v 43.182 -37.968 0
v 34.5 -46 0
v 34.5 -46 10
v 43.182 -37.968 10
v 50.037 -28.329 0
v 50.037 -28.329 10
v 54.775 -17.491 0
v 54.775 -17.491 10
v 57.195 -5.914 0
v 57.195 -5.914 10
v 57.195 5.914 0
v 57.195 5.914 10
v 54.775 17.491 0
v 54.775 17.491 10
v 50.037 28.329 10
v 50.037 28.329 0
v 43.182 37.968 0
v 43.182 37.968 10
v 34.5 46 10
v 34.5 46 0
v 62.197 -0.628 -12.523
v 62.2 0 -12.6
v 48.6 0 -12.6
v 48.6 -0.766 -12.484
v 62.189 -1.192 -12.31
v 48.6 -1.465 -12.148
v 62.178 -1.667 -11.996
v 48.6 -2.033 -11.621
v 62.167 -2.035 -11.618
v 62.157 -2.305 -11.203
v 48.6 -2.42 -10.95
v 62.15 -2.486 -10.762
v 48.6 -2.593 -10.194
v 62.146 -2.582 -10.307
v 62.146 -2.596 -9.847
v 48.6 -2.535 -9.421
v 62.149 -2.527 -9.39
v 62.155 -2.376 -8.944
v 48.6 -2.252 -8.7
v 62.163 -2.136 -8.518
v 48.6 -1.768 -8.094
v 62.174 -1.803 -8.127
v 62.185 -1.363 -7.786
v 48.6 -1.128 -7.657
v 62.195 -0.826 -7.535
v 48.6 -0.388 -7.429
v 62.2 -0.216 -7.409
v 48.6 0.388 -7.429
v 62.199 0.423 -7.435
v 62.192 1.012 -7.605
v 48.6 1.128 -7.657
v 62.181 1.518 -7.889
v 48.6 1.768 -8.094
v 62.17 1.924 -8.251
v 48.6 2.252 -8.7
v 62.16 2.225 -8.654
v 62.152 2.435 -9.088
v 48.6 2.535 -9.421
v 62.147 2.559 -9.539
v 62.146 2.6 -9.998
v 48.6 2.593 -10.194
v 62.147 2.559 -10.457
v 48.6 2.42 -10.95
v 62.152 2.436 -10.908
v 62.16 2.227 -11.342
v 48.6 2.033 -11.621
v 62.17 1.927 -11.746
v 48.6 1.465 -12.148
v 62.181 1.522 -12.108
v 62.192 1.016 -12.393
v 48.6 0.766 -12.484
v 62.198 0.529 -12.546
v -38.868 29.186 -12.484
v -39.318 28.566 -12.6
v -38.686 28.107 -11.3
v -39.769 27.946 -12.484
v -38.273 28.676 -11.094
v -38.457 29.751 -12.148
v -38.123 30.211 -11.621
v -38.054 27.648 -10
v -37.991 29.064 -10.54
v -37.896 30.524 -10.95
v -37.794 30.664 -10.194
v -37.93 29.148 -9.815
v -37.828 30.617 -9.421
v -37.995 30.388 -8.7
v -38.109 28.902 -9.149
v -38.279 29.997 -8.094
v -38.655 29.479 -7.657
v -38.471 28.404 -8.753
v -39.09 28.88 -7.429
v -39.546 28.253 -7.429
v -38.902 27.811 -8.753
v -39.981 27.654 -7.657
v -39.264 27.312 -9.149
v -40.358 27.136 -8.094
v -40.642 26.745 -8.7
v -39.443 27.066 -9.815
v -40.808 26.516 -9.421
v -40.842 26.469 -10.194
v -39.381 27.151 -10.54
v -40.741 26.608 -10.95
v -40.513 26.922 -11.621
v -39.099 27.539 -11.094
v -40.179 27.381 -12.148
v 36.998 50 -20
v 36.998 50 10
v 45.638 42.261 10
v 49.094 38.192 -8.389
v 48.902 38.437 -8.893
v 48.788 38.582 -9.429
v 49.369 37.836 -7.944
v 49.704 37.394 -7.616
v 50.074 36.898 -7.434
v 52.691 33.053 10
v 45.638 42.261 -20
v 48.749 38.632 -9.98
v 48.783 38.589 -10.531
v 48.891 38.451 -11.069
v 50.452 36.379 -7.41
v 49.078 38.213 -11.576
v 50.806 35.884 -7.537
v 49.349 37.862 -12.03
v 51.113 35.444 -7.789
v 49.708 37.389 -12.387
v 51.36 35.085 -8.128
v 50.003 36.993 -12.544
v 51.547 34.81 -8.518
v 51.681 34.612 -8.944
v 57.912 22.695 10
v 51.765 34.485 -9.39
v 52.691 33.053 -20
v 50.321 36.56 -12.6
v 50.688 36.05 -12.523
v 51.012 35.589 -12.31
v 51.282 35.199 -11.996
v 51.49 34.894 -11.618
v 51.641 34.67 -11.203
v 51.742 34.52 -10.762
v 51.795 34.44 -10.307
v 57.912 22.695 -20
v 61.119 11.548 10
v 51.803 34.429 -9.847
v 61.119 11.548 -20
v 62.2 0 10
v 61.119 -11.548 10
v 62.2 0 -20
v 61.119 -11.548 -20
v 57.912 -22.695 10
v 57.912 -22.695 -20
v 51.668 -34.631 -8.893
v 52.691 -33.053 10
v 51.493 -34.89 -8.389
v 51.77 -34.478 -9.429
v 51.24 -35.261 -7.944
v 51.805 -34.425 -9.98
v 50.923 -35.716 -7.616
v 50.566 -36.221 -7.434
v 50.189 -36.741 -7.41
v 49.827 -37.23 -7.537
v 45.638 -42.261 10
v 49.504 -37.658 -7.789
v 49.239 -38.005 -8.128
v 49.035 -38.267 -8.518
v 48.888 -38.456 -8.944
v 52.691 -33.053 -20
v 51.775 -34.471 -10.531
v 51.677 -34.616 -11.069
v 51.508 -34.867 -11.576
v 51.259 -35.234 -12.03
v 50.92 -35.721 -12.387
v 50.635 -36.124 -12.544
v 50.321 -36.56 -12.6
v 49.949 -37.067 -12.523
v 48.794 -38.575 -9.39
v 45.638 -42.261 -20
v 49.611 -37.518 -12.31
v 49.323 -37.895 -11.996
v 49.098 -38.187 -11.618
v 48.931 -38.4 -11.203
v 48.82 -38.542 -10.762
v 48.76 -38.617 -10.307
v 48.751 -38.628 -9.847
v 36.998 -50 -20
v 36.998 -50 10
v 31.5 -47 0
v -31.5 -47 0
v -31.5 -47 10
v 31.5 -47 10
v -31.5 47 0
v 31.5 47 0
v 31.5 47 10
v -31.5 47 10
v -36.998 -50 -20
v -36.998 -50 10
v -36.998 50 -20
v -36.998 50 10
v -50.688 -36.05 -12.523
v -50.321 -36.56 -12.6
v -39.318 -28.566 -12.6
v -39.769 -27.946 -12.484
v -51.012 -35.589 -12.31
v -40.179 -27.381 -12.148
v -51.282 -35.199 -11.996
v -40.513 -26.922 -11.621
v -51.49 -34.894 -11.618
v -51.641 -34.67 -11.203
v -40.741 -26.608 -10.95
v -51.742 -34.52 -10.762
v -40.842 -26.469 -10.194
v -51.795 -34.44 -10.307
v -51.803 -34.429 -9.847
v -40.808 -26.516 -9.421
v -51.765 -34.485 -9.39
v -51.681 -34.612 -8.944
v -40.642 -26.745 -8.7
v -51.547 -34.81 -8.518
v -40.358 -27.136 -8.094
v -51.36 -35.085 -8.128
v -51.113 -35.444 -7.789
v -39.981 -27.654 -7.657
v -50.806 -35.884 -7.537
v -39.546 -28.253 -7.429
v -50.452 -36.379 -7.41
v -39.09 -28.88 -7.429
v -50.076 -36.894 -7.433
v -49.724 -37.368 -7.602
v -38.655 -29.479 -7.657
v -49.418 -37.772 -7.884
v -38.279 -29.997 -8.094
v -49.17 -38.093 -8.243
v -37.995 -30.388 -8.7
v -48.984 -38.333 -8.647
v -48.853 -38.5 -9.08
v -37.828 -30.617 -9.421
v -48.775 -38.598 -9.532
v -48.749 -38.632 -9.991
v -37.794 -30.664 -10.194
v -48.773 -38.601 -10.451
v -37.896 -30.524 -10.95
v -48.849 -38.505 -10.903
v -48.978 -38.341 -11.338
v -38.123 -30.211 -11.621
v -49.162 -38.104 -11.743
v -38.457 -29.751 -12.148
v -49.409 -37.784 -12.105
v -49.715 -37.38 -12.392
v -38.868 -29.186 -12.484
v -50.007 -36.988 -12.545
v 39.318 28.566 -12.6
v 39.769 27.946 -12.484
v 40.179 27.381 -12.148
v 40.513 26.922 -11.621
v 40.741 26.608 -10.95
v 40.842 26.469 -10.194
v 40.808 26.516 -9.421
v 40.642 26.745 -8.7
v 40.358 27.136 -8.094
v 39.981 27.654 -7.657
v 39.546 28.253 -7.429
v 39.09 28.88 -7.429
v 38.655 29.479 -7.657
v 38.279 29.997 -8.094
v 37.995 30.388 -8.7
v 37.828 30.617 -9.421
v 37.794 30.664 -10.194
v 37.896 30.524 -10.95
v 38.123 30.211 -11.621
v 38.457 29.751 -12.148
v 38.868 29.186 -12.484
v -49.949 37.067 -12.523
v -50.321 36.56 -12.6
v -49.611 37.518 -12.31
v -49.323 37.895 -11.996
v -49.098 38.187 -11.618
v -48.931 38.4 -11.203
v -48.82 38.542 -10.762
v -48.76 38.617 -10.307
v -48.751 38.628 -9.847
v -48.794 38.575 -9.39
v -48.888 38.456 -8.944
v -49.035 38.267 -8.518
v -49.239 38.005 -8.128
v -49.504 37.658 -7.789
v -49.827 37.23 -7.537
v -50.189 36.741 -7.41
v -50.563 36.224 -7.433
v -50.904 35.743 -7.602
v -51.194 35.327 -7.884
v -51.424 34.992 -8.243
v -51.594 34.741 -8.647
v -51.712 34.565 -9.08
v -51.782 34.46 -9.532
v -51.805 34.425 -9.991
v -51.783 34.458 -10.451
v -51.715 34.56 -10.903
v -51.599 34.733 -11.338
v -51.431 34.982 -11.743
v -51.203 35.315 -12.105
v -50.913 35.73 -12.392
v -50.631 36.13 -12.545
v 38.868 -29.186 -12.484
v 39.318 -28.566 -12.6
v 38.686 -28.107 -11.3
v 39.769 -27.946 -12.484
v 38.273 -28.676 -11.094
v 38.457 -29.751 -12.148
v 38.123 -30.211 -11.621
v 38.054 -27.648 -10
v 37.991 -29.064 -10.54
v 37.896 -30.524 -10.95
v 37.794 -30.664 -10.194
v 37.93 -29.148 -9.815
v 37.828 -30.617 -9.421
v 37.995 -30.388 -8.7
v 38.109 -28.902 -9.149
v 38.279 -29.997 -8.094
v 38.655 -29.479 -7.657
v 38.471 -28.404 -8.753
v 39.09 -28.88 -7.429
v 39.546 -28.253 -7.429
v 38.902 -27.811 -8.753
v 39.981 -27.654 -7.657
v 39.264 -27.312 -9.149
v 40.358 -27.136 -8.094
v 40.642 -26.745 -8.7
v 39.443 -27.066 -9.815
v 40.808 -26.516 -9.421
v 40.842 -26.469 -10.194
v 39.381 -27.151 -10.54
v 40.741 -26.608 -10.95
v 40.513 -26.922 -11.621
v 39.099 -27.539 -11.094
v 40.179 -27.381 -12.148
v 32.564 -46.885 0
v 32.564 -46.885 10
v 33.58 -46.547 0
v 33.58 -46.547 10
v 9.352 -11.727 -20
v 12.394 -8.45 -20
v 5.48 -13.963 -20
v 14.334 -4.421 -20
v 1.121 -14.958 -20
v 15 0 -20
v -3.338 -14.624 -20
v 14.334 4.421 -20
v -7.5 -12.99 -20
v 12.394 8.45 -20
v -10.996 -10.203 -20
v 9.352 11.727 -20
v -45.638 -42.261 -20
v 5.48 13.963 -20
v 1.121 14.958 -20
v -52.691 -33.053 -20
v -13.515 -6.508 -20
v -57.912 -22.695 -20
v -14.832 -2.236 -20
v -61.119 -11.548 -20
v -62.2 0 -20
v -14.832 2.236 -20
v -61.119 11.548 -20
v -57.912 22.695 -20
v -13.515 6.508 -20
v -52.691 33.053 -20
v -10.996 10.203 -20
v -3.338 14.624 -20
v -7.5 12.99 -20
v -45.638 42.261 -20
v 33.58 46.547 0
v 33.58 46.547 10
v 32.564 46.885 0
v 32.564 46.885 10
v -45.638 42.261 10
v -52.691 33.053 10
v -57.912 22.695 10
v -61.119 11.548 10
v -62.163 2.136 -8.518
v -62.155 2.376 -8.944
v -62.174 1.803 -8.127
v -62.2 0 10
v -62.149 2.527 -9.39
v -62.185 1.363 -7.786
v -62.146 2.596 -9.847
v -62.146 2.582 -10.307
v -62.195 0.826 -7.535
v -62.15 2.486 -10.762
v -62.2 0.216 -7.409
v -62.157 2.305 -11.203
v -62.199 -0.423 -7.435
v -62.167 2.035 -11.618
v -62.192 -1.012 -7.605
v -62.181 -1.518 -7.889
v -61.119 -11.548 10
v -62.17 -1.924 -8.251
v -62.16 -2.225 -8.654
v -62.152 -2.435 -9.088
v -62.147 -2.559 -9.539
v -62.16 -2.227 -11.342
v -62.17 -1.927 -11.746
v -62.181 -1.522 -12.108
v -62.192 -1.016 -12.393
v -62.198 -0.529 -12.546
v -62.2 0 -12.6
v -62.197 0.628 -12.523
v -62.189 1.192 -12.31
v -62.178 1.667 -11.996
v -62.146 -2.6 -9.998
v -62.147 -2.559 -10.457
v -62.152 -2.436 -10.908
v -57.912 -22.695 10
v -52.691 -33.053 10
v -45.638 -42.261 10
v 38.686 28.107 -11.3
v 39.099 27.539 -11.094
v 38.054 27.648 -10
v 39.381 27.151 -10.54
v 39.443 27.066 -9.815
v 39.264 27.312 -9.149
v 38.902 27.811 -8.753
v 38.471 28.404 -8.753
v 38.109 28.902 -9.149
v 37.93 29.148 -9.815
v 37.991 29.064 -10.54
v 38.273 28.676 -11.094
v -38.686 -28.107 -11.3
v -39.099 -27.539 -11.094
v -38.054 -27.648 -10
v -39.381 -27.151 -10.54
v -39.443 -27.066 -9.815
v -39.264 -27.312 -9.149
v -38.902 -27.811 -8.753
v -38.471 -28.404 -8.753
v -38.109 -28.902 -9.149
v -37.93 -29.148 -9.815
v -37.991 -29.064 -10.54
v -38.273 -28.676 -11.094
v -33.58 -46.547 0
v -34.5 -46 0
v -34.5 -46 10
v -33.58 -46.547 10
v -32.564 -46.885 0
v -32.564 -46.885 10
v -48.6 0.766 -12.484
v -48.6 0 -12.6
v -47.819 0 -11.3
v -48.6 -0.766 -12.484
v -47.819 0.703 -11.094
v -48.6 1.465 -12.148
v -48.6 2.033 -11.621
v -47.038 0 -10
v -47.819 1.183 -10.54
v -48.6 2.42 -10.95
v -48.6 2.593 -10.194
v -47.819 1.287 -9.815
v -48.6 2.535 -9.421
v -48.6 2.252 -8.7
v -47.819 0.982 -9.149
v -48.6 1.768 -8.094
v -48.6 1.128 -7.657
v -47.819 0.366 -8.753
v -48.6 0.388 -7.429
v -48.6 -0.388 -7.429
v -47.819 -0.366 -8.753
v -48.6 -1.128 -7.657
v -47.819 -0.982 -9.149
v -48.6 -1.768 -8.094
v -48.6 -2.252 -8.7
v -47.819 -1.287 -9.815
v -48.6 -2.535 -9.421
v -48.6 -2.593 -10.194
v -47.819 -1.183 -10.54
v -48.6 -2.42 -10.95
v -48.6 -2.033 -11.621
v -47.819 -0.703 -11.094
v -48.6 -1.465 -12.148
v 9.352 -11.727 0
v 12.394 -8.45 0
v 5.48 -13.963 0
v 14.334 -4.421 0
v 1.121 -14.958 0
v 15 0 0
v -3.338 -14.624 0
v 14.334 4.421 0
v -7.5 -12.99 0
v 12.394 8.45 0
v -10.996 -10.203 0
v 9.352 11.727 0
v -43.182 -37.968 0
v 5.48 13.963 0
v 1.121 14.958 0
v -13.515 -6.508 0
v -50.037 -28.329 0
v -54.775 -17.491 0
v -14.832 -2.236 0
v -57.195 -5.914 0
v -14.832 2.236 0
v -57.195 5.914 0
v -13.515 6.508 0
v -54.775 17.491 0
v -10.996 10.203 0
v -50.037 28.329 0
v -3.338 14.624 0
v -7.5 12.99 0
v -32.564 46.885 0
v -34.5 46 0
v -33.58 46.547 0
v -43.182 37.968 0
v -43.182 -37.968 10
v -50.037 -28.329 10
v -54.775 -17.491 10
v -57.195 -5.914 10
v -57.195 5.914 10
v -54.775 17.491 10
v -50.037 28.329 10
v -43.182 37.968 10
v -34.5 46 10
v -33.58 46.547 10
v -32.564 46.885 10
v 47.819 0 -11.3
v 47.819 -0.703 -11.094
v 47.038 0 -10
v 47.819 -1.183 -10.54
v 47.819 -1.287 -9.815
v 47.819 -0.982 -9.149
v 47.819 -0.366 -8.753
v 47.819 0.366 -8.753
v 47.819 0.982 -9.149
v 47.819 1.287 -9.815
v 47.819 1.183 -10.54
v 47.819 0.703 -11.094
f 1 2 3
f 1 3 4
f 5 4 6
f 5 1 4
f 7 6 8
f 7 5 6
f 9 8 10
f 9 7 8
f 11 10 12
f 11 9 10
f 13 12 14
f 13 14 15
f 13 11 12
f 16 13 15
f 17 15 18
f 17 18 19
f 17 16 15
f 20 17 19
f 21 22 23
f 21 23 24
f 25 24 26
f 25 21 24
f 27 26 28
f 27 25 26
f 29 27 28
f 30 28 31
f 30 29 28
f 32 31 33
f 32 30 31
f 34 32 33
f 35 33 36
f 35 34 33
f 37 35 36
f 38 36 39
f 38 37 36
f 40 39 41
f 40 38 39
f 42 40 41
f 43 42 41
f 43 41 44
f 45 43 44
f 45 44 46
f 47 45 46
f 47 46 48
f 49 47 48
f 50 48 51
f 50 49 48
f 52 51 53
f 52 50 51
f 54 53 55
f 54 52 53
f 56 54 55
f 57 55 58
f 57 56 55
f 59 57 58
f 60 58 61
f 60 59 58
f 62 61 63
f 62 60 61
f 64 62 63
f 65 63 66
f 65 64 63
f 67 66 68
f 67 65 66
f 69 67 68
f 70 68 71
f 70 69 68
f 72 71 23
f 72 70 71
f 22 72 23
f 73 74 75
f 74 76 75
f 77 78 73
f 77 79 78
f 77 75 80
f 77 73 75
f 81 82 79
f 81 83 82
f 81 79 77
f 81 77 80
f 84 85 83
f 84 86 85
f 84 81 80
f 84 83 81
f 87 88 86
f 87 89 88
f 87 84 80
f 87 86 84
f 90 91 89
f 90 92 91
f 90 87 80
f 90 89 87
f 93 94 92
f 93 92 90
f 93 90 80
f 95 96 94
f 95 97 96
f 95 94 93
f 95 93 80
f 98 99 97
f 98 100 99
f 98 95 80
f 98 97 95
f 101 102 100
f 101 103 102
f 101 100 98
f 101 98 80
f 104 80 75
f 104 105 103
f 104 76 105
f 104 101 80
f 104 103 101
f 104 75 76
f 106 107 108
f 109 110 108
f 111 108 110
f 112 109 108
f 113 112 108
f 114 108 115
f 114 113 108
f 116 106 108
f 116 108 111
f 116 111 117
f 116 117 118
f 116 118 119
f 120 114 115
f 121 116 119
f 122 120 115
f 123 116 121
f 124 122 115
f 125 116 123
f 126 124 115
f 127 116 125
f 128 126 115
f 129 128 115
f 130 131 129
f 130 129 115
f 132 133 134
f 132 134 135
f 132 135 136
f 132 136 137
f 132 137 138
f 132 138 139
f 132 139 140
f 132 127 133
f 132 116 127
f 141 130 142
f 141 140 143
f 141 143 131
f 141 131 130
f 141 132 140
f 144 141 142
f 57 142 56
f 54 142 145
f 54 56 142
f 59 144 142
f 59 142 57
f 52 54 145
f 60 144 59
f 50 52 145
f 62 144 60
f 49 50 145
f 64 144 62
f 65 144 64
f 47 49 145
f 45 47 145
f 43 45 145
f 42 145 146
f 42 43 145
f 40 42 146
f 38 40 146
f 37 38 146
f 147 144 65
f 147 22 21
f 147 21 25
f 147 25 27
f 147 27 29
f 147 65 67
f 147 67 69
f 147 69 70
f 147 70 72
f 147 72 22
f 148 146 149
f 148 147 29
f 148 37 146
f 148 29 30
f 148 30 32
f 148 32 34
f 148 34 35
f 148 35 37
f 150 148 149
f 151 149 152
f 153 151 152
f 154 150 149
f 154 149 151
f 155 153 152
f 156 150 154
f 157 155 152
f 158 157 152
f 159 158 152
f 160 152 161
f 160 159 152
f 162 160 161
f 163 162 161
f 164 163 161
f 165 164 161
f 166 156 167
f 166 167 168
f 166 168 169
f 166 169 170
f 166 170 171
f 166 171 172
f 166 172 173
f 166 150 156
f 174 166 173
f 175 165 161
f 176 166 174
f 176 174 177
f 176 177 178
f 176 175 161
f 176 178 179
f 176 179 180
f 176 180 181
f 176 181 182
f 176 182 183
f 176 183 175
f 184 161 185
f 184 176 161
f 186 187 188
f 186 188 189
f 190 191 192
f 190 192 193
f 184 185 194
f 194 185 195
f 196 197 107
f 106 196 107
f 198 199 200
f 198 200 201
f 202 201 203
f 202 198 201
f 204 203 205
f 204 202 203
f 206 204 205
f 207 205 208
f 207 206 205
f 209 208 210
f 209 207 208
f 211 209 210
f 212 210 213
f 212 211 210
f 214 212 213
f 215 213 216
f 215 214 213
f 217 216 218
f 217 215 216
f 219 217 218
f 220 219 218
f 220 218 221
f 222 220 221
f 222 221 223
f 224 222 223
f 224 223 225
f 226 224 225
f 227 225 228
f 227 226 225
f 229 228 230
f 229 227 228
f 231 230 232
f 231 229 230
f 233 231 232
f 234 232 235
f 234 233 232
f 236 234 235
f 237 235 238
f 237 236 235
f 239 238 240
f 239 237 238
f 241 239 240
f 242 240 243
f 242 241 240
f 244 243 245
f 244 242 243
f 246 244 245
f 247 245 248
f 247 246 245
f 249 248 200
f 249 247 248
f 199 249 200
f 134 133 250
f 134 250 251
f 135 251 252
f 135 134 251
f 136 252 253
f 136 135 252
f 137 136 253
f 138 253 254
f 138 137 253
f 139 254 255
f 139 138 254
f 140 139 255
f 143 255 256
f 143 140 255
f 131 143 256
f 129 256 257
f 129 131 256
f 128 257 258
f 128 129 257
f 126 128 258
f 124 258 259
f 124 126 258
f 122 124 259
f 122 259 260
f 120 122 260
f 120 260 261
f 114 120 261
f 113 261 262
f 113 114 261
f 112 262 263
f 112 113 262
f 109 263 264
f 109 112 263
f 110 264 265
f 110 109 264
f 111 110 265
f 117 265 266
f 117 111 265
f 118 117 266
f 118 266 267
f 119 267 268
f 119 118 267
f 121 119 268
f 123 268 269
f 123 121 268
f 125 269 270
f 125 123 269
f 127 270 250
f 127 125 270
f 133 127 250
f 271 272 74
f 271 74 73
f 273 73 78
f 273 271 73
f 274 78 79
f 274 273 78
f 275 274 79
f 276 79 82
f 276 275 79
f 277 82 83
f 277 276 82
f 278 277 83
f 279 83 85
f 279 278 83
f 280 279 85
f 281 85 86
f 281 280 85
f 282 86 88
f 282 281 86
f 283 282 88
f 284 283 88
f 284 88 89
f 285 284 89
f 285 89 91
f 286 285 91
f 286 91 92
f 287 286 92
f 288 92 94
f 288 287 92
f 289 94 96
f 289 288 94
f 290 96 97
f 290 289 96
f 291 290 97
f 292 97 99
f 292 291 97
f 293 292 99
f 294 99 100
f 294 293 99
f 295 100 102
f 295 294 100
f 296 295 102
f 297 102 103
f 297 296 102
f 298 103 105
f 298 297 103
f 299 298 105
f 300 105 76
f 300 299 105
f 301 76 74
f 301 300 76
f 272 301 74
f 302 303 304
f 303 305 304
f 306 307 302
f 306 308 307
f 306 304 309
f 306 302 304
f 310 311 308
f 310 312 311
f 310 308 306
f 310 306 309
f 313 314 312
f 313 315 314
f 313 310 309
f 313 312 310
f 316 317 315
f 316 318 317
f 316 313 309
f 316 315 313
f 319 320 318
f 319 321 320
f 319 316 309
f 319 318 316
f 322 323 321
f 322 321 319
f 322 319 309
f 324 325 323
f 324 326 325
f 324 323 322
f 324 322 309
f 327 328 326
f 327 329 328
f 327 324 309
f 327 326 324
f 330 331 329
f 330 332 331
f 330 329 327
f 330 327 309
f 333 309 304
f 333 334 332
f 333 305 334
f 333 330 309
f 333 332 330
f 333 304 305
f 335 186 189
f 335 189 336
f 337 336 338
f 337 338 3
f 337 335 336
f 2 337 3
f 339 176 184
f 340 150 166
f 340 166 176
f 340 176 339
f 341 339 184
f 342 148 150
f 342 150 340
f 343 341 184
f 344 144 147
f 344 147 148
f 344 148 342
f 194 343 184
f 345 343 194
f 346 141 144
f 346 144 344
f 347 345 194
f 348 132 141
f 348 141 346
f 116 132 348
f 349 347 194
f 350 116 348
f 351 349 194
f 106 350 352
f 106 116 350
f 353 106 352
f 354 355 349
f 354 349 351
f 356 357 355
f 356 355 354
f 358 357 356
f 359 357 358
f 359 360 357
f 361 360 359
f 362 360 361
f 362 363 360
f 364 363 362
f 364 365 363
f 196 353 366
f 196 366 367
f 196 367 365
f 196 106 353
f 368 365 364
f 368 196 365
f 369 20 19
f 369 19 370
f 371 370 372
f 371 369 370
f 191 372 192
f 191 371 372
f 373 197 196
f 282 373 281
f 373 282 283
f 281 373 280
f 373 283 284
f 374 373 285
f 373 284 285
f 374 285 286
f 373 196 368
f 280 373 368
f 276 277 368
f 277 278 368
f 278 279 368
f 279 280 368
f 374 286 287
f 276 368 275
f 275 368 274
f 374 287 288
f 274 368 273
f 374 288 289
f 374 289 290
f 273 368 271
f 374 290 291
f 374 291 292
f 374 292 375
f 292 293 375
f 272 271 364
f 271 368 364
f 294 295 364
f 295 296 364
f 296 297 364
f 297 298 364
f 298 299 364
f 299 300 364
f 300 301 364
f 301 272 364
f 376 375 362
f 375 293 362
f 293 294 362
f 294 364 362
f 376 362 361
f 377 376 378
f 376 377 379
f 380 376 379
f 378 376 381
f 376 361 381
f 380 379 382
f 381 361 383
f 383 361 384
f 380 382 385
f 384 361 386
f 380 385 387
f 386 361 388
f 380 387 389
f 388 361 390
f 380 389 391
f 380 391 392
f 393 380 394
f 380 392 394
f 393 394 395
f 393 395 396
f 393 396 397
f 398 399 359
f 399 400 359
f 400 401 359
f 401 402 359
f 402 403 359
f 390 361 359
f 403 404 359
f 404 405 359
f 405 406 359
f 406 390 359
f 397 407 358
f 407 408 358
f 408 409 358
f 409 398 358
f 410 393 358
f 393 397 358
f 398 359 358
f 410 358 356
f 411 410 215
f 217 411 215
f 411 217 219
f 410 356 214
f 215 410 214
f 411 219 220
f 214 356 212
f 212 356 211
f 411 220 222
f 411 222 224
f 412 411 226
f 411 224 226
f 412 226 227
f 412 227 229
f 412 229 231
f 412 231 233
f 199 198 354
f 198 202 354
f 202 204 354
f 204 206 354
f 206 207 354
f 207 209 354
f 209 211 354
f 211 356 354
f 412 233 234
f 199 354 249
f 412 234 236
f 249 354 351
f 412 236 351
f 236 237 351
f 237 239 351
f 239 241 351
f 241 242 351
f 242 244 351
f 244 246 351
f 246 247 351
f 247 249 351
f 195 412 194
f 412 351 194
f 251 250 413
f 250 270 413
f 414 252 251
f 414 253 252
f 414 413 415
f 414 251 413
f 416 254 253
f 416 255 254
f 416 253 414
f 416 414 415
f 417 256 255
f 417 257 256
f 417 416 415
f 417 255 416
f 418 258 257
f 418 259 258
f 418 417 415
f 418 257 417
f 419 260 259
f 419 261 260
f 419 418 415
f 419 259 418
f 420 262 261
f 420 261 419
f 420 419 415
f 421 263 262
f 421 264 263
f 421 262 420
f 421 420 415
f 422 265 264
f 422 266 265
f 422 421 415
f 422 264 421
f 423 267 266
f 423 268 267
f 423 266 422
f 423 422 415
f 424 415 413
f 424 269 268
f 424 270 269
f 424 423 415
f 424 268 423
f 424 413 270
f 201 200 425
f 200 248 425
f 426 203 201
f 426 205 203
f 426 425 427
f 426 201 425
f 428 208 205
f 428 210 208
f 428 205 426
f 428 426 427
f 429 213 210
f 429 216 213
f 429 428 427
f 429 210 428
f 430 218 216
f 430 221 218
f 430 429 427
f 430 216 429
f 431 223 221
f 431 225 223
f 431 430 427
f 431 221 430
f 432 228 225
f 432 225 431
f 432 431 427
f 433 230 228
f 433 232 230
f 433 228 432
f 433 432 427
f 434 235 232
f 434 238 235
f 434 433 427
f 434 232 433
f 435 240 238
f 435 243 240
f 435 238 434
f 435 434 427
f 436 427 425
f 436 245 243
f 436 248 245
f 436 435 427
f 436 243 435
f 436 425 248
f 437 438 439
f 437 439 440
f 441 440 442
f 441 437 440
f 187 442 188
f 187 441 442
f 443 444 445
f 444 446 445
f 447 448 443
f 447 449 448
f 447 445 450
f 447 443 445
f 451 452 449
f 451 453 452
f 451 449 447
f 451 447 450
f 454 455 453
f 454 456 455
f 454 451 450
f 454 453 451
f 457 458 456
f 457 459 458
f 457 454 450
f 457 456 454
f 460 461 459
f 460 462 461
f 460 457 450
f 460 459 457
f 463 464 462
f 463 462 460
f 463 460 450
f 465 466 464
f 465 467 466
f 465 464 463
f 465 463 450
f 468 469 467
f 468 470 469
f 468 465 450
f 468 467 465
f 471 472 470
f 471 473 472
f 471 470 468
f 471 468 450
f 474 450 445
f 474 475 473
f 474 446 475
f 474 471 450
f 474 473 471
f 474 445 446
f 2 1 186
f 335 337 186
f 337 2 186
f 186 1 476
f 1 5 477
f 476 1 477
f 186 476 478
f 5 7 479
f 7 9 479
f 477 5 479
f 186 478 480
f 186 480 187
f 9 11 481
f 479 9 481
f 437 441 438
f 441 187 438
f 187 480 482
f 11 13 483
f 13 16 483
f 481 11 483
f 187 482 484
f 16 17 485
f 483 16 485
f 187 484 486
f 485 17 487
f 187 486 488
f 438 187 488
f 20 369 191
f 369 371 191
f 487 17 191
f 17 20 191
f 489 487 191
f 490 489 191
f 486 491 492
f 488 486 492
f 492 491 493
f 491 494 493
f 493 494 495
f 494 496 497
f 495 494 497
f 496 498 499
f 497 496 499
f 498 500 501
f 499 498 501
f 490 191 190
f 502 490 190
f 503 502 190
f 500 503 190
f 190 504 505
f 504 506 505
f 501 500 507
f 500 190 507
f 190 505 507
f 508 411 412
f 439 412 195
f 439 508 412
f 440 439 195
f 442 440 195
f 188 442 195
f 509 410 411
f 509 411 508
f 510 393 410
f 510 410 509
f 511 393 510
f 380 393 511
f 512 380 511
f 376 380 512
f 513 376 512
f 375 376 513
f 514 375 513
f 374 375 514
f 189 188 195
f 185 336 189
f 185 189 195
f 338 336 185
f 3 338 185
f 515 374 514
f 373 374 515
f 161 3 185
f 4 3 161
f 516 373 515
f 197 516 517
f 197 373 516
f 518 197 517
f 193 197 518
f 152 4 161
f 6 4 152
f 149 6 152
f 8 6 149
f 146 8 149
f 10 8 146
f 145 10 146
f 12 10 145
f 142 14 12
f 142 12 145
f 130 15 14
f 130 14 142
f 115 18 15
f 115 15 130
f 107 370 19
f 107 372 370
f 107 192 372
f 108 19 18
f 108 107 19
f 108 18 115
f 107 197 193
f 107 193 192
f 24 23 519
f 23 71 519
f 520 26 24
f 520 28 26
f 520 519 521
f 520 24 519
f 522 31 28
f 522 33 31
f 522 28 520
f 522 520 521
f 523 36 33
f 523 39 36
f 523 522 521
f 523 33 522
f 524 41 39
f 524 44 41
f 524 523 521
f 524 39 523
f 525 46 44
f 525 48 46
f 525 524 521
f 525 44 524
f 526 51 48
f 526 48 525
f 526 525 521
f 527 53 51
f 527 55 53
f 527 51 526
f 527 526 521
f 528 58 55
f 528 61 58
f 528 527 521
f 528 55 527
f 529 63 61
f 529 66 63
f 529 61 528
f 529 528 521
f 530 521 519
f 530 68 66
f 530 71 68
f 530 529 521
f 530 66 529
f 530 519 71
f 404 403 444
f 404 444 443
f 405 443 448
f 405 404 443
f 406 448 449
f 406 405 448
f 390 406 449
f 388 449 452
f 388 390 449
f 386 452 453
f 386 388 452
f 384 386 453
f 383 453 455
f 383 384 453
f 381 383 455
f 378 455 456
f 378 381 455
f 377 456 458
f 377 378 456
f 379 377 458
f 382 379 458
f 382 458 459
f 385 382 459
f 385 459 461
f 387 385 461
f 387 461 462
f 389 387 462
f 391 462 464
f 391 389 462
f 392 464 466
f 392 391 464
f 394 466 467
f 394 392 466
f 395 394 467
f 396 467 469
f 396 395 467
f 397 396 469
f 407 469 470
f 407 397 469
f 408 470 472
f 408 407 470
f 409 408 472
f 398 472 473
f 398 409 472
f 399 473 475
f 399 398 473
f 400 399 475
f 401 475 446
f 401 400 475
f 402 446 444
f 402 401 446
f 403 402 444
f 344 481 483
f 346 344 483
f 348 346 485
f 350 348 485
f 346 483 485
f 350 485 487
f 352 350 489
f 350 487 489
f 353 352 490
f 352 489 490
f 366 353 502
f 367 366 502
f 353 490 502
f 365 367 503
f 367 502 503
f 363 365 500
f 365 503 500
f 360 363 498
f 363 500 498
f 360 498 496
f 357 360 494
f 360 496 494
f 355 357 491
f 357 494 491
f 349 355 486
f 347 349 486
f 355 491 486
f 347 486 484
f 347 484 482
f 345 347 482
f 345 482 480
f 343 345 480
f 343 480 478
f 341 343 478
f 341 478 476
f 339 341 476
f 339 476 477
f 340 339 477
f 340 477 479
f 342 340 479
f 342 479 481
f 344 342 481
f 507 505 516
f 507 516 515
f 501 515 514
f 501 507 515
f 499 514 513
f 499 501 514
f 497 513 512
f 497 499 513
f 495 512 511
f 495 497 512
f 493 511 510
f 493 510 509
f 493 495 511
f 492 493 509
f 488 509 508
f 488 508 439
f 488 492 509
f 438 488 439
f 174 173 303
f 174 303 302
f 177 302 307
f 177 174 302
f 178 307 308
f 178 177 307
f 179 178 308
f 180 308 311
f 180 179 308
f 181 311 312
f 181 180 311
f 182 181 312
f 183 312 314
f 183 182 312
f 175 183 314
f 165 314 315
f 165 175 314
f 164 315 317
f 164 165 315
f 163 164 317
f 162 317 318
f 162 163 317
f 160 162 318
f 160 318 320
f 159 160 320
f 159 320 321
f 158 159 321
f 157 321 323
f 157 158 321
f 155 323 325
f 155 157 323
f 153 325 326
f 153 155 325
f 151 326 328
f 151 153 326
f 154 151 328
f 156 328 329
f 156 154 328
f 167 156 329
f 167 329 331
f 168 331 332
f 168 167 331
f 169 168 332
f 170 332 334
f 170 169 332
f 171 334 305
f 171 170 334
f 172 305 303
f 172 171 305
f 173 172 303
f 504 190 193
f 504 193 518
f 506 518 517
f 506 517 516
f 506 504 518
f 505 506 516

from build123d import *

# Parameters (mm, degrees)
IZIM1_R                     = 62.2
Y_KSEKLIK_EKSTR_ZYON3_DEPTH = 10
Y_KSEKLIK_EKSTR_ZYON4_START = 20
IZIM2_R                     = 62.2
Y_KSEKLIK_EKSTR_ZYON4_DEPTH = 20
IZIM12_R                    = 15
KES_EKSTR_ZYON1_DEPTH       = 93.939119858
DAIRESEL_KAPLAMA1_COUNT     = 10


with BuildPart() as part:
    # Çizim1 → Yükseklik-Ekstrüzyon3 (new body)
    with BuildSketch(Plane.XY):
        Circle(IZIM1_R)
        with BuildLine():
            Line((31.5, 47), (-31.5, 47))
            ThreePointArc((-31.5, 47), (-33.08113883, 46.74341649), (-34.5, 46))
            ThreePointArc((-34.5, 46), (-57.5, 0), (-34.5, -46))
            ThreePointArc((-34.5, -46), (-33.08113883, -46.74341649), (-31.5, -47))
            Line((-31.5, -47), (31.5, -47))
            ThreePointArc((31.5, -47), (33.08113883, -46.74341649), (34.5, -46))
            ThreePointArc((34.5, -46), (57.5, 0), (34.5, 46))
            ThreePointArc((34.5, 46), (33.08113883, 46.74341649), (31.5, 47))
        make_face(mode=Mode.SUBTRACT)
    extrude(amount=Y_KSEKLIK_EKSTR_ZYON3_DEPTH)

    # Çizim2 → Yükseklik-Ekstrüzyon4 (add)
    with BuildSketch(Plane(origin=(0, 0, 0), x_dir=(-1, 0, 0), z_dir=(0, 0, -1)).offset(Y_KSEKLIK_EKSTR_ZYON4_START)):
        Circle(IZIM2_R)
    extrude(amount=-Y_KSEKLIK_EKSTR_ZYON4_DEPTH)

    # Çizim12 → Kes-Ekstrüzyon1 (cut, through all)
    with BuildSketch(Plane.XY.offset(10)):
        Circle(IZIM12_R)
        Polygon((-50.603744818, 50), (50.603744818, 50), (-3.038589064, 77.096458803), align=None)
        Polygon((36.997837775, -50), (-36.997837775, -50), (-1.176281375, -79.482501569), align=None)
    extrude(amount=-KES_EKSTR_ZYON1_DEPTH, mode=Mode.SUBTRACT)

    # Çizim15 → M5x0.8 Helisarmal İçin Dişli Delik1 (revolve, cut)
    with BuildSketch(Plane(origin=(62.2, 0, -10), x_dir=(0, 0, -1), z_dir=(0, 1, 0))):
        Polygon((0, 0), (0, 15.162237609), (2.6, 13.6), (2.6, 0), align=None)
    m5x0_8_helisarmal_in_di_li_delik1 = revolve(axis=Axis((68.55, 0, -10), (-1, 0, 0)), mode=Mode.SUBTRACT)

    # Dairesel Kaplama1: M5x0.8 Helisarmal İçin Dişli Delik1 ×10 about axis, 4 skipped
    dairesel_kaplama1_axis = Axis((0, 0, 10), (0, 0, 1))
    add([m5x0_8_helisarmal_in_di_li_delik1.rotate(dairesel_kaplama1_axis, i * 360 / DAIRESEL_KAPLAMA1_COUNT) for i in range(1, DAIRESEL_KAPLAMA1_COUNT) if i not in (2, 3, 7, 8)], mode=Mode.SUBTRACT)


solid = part.part
